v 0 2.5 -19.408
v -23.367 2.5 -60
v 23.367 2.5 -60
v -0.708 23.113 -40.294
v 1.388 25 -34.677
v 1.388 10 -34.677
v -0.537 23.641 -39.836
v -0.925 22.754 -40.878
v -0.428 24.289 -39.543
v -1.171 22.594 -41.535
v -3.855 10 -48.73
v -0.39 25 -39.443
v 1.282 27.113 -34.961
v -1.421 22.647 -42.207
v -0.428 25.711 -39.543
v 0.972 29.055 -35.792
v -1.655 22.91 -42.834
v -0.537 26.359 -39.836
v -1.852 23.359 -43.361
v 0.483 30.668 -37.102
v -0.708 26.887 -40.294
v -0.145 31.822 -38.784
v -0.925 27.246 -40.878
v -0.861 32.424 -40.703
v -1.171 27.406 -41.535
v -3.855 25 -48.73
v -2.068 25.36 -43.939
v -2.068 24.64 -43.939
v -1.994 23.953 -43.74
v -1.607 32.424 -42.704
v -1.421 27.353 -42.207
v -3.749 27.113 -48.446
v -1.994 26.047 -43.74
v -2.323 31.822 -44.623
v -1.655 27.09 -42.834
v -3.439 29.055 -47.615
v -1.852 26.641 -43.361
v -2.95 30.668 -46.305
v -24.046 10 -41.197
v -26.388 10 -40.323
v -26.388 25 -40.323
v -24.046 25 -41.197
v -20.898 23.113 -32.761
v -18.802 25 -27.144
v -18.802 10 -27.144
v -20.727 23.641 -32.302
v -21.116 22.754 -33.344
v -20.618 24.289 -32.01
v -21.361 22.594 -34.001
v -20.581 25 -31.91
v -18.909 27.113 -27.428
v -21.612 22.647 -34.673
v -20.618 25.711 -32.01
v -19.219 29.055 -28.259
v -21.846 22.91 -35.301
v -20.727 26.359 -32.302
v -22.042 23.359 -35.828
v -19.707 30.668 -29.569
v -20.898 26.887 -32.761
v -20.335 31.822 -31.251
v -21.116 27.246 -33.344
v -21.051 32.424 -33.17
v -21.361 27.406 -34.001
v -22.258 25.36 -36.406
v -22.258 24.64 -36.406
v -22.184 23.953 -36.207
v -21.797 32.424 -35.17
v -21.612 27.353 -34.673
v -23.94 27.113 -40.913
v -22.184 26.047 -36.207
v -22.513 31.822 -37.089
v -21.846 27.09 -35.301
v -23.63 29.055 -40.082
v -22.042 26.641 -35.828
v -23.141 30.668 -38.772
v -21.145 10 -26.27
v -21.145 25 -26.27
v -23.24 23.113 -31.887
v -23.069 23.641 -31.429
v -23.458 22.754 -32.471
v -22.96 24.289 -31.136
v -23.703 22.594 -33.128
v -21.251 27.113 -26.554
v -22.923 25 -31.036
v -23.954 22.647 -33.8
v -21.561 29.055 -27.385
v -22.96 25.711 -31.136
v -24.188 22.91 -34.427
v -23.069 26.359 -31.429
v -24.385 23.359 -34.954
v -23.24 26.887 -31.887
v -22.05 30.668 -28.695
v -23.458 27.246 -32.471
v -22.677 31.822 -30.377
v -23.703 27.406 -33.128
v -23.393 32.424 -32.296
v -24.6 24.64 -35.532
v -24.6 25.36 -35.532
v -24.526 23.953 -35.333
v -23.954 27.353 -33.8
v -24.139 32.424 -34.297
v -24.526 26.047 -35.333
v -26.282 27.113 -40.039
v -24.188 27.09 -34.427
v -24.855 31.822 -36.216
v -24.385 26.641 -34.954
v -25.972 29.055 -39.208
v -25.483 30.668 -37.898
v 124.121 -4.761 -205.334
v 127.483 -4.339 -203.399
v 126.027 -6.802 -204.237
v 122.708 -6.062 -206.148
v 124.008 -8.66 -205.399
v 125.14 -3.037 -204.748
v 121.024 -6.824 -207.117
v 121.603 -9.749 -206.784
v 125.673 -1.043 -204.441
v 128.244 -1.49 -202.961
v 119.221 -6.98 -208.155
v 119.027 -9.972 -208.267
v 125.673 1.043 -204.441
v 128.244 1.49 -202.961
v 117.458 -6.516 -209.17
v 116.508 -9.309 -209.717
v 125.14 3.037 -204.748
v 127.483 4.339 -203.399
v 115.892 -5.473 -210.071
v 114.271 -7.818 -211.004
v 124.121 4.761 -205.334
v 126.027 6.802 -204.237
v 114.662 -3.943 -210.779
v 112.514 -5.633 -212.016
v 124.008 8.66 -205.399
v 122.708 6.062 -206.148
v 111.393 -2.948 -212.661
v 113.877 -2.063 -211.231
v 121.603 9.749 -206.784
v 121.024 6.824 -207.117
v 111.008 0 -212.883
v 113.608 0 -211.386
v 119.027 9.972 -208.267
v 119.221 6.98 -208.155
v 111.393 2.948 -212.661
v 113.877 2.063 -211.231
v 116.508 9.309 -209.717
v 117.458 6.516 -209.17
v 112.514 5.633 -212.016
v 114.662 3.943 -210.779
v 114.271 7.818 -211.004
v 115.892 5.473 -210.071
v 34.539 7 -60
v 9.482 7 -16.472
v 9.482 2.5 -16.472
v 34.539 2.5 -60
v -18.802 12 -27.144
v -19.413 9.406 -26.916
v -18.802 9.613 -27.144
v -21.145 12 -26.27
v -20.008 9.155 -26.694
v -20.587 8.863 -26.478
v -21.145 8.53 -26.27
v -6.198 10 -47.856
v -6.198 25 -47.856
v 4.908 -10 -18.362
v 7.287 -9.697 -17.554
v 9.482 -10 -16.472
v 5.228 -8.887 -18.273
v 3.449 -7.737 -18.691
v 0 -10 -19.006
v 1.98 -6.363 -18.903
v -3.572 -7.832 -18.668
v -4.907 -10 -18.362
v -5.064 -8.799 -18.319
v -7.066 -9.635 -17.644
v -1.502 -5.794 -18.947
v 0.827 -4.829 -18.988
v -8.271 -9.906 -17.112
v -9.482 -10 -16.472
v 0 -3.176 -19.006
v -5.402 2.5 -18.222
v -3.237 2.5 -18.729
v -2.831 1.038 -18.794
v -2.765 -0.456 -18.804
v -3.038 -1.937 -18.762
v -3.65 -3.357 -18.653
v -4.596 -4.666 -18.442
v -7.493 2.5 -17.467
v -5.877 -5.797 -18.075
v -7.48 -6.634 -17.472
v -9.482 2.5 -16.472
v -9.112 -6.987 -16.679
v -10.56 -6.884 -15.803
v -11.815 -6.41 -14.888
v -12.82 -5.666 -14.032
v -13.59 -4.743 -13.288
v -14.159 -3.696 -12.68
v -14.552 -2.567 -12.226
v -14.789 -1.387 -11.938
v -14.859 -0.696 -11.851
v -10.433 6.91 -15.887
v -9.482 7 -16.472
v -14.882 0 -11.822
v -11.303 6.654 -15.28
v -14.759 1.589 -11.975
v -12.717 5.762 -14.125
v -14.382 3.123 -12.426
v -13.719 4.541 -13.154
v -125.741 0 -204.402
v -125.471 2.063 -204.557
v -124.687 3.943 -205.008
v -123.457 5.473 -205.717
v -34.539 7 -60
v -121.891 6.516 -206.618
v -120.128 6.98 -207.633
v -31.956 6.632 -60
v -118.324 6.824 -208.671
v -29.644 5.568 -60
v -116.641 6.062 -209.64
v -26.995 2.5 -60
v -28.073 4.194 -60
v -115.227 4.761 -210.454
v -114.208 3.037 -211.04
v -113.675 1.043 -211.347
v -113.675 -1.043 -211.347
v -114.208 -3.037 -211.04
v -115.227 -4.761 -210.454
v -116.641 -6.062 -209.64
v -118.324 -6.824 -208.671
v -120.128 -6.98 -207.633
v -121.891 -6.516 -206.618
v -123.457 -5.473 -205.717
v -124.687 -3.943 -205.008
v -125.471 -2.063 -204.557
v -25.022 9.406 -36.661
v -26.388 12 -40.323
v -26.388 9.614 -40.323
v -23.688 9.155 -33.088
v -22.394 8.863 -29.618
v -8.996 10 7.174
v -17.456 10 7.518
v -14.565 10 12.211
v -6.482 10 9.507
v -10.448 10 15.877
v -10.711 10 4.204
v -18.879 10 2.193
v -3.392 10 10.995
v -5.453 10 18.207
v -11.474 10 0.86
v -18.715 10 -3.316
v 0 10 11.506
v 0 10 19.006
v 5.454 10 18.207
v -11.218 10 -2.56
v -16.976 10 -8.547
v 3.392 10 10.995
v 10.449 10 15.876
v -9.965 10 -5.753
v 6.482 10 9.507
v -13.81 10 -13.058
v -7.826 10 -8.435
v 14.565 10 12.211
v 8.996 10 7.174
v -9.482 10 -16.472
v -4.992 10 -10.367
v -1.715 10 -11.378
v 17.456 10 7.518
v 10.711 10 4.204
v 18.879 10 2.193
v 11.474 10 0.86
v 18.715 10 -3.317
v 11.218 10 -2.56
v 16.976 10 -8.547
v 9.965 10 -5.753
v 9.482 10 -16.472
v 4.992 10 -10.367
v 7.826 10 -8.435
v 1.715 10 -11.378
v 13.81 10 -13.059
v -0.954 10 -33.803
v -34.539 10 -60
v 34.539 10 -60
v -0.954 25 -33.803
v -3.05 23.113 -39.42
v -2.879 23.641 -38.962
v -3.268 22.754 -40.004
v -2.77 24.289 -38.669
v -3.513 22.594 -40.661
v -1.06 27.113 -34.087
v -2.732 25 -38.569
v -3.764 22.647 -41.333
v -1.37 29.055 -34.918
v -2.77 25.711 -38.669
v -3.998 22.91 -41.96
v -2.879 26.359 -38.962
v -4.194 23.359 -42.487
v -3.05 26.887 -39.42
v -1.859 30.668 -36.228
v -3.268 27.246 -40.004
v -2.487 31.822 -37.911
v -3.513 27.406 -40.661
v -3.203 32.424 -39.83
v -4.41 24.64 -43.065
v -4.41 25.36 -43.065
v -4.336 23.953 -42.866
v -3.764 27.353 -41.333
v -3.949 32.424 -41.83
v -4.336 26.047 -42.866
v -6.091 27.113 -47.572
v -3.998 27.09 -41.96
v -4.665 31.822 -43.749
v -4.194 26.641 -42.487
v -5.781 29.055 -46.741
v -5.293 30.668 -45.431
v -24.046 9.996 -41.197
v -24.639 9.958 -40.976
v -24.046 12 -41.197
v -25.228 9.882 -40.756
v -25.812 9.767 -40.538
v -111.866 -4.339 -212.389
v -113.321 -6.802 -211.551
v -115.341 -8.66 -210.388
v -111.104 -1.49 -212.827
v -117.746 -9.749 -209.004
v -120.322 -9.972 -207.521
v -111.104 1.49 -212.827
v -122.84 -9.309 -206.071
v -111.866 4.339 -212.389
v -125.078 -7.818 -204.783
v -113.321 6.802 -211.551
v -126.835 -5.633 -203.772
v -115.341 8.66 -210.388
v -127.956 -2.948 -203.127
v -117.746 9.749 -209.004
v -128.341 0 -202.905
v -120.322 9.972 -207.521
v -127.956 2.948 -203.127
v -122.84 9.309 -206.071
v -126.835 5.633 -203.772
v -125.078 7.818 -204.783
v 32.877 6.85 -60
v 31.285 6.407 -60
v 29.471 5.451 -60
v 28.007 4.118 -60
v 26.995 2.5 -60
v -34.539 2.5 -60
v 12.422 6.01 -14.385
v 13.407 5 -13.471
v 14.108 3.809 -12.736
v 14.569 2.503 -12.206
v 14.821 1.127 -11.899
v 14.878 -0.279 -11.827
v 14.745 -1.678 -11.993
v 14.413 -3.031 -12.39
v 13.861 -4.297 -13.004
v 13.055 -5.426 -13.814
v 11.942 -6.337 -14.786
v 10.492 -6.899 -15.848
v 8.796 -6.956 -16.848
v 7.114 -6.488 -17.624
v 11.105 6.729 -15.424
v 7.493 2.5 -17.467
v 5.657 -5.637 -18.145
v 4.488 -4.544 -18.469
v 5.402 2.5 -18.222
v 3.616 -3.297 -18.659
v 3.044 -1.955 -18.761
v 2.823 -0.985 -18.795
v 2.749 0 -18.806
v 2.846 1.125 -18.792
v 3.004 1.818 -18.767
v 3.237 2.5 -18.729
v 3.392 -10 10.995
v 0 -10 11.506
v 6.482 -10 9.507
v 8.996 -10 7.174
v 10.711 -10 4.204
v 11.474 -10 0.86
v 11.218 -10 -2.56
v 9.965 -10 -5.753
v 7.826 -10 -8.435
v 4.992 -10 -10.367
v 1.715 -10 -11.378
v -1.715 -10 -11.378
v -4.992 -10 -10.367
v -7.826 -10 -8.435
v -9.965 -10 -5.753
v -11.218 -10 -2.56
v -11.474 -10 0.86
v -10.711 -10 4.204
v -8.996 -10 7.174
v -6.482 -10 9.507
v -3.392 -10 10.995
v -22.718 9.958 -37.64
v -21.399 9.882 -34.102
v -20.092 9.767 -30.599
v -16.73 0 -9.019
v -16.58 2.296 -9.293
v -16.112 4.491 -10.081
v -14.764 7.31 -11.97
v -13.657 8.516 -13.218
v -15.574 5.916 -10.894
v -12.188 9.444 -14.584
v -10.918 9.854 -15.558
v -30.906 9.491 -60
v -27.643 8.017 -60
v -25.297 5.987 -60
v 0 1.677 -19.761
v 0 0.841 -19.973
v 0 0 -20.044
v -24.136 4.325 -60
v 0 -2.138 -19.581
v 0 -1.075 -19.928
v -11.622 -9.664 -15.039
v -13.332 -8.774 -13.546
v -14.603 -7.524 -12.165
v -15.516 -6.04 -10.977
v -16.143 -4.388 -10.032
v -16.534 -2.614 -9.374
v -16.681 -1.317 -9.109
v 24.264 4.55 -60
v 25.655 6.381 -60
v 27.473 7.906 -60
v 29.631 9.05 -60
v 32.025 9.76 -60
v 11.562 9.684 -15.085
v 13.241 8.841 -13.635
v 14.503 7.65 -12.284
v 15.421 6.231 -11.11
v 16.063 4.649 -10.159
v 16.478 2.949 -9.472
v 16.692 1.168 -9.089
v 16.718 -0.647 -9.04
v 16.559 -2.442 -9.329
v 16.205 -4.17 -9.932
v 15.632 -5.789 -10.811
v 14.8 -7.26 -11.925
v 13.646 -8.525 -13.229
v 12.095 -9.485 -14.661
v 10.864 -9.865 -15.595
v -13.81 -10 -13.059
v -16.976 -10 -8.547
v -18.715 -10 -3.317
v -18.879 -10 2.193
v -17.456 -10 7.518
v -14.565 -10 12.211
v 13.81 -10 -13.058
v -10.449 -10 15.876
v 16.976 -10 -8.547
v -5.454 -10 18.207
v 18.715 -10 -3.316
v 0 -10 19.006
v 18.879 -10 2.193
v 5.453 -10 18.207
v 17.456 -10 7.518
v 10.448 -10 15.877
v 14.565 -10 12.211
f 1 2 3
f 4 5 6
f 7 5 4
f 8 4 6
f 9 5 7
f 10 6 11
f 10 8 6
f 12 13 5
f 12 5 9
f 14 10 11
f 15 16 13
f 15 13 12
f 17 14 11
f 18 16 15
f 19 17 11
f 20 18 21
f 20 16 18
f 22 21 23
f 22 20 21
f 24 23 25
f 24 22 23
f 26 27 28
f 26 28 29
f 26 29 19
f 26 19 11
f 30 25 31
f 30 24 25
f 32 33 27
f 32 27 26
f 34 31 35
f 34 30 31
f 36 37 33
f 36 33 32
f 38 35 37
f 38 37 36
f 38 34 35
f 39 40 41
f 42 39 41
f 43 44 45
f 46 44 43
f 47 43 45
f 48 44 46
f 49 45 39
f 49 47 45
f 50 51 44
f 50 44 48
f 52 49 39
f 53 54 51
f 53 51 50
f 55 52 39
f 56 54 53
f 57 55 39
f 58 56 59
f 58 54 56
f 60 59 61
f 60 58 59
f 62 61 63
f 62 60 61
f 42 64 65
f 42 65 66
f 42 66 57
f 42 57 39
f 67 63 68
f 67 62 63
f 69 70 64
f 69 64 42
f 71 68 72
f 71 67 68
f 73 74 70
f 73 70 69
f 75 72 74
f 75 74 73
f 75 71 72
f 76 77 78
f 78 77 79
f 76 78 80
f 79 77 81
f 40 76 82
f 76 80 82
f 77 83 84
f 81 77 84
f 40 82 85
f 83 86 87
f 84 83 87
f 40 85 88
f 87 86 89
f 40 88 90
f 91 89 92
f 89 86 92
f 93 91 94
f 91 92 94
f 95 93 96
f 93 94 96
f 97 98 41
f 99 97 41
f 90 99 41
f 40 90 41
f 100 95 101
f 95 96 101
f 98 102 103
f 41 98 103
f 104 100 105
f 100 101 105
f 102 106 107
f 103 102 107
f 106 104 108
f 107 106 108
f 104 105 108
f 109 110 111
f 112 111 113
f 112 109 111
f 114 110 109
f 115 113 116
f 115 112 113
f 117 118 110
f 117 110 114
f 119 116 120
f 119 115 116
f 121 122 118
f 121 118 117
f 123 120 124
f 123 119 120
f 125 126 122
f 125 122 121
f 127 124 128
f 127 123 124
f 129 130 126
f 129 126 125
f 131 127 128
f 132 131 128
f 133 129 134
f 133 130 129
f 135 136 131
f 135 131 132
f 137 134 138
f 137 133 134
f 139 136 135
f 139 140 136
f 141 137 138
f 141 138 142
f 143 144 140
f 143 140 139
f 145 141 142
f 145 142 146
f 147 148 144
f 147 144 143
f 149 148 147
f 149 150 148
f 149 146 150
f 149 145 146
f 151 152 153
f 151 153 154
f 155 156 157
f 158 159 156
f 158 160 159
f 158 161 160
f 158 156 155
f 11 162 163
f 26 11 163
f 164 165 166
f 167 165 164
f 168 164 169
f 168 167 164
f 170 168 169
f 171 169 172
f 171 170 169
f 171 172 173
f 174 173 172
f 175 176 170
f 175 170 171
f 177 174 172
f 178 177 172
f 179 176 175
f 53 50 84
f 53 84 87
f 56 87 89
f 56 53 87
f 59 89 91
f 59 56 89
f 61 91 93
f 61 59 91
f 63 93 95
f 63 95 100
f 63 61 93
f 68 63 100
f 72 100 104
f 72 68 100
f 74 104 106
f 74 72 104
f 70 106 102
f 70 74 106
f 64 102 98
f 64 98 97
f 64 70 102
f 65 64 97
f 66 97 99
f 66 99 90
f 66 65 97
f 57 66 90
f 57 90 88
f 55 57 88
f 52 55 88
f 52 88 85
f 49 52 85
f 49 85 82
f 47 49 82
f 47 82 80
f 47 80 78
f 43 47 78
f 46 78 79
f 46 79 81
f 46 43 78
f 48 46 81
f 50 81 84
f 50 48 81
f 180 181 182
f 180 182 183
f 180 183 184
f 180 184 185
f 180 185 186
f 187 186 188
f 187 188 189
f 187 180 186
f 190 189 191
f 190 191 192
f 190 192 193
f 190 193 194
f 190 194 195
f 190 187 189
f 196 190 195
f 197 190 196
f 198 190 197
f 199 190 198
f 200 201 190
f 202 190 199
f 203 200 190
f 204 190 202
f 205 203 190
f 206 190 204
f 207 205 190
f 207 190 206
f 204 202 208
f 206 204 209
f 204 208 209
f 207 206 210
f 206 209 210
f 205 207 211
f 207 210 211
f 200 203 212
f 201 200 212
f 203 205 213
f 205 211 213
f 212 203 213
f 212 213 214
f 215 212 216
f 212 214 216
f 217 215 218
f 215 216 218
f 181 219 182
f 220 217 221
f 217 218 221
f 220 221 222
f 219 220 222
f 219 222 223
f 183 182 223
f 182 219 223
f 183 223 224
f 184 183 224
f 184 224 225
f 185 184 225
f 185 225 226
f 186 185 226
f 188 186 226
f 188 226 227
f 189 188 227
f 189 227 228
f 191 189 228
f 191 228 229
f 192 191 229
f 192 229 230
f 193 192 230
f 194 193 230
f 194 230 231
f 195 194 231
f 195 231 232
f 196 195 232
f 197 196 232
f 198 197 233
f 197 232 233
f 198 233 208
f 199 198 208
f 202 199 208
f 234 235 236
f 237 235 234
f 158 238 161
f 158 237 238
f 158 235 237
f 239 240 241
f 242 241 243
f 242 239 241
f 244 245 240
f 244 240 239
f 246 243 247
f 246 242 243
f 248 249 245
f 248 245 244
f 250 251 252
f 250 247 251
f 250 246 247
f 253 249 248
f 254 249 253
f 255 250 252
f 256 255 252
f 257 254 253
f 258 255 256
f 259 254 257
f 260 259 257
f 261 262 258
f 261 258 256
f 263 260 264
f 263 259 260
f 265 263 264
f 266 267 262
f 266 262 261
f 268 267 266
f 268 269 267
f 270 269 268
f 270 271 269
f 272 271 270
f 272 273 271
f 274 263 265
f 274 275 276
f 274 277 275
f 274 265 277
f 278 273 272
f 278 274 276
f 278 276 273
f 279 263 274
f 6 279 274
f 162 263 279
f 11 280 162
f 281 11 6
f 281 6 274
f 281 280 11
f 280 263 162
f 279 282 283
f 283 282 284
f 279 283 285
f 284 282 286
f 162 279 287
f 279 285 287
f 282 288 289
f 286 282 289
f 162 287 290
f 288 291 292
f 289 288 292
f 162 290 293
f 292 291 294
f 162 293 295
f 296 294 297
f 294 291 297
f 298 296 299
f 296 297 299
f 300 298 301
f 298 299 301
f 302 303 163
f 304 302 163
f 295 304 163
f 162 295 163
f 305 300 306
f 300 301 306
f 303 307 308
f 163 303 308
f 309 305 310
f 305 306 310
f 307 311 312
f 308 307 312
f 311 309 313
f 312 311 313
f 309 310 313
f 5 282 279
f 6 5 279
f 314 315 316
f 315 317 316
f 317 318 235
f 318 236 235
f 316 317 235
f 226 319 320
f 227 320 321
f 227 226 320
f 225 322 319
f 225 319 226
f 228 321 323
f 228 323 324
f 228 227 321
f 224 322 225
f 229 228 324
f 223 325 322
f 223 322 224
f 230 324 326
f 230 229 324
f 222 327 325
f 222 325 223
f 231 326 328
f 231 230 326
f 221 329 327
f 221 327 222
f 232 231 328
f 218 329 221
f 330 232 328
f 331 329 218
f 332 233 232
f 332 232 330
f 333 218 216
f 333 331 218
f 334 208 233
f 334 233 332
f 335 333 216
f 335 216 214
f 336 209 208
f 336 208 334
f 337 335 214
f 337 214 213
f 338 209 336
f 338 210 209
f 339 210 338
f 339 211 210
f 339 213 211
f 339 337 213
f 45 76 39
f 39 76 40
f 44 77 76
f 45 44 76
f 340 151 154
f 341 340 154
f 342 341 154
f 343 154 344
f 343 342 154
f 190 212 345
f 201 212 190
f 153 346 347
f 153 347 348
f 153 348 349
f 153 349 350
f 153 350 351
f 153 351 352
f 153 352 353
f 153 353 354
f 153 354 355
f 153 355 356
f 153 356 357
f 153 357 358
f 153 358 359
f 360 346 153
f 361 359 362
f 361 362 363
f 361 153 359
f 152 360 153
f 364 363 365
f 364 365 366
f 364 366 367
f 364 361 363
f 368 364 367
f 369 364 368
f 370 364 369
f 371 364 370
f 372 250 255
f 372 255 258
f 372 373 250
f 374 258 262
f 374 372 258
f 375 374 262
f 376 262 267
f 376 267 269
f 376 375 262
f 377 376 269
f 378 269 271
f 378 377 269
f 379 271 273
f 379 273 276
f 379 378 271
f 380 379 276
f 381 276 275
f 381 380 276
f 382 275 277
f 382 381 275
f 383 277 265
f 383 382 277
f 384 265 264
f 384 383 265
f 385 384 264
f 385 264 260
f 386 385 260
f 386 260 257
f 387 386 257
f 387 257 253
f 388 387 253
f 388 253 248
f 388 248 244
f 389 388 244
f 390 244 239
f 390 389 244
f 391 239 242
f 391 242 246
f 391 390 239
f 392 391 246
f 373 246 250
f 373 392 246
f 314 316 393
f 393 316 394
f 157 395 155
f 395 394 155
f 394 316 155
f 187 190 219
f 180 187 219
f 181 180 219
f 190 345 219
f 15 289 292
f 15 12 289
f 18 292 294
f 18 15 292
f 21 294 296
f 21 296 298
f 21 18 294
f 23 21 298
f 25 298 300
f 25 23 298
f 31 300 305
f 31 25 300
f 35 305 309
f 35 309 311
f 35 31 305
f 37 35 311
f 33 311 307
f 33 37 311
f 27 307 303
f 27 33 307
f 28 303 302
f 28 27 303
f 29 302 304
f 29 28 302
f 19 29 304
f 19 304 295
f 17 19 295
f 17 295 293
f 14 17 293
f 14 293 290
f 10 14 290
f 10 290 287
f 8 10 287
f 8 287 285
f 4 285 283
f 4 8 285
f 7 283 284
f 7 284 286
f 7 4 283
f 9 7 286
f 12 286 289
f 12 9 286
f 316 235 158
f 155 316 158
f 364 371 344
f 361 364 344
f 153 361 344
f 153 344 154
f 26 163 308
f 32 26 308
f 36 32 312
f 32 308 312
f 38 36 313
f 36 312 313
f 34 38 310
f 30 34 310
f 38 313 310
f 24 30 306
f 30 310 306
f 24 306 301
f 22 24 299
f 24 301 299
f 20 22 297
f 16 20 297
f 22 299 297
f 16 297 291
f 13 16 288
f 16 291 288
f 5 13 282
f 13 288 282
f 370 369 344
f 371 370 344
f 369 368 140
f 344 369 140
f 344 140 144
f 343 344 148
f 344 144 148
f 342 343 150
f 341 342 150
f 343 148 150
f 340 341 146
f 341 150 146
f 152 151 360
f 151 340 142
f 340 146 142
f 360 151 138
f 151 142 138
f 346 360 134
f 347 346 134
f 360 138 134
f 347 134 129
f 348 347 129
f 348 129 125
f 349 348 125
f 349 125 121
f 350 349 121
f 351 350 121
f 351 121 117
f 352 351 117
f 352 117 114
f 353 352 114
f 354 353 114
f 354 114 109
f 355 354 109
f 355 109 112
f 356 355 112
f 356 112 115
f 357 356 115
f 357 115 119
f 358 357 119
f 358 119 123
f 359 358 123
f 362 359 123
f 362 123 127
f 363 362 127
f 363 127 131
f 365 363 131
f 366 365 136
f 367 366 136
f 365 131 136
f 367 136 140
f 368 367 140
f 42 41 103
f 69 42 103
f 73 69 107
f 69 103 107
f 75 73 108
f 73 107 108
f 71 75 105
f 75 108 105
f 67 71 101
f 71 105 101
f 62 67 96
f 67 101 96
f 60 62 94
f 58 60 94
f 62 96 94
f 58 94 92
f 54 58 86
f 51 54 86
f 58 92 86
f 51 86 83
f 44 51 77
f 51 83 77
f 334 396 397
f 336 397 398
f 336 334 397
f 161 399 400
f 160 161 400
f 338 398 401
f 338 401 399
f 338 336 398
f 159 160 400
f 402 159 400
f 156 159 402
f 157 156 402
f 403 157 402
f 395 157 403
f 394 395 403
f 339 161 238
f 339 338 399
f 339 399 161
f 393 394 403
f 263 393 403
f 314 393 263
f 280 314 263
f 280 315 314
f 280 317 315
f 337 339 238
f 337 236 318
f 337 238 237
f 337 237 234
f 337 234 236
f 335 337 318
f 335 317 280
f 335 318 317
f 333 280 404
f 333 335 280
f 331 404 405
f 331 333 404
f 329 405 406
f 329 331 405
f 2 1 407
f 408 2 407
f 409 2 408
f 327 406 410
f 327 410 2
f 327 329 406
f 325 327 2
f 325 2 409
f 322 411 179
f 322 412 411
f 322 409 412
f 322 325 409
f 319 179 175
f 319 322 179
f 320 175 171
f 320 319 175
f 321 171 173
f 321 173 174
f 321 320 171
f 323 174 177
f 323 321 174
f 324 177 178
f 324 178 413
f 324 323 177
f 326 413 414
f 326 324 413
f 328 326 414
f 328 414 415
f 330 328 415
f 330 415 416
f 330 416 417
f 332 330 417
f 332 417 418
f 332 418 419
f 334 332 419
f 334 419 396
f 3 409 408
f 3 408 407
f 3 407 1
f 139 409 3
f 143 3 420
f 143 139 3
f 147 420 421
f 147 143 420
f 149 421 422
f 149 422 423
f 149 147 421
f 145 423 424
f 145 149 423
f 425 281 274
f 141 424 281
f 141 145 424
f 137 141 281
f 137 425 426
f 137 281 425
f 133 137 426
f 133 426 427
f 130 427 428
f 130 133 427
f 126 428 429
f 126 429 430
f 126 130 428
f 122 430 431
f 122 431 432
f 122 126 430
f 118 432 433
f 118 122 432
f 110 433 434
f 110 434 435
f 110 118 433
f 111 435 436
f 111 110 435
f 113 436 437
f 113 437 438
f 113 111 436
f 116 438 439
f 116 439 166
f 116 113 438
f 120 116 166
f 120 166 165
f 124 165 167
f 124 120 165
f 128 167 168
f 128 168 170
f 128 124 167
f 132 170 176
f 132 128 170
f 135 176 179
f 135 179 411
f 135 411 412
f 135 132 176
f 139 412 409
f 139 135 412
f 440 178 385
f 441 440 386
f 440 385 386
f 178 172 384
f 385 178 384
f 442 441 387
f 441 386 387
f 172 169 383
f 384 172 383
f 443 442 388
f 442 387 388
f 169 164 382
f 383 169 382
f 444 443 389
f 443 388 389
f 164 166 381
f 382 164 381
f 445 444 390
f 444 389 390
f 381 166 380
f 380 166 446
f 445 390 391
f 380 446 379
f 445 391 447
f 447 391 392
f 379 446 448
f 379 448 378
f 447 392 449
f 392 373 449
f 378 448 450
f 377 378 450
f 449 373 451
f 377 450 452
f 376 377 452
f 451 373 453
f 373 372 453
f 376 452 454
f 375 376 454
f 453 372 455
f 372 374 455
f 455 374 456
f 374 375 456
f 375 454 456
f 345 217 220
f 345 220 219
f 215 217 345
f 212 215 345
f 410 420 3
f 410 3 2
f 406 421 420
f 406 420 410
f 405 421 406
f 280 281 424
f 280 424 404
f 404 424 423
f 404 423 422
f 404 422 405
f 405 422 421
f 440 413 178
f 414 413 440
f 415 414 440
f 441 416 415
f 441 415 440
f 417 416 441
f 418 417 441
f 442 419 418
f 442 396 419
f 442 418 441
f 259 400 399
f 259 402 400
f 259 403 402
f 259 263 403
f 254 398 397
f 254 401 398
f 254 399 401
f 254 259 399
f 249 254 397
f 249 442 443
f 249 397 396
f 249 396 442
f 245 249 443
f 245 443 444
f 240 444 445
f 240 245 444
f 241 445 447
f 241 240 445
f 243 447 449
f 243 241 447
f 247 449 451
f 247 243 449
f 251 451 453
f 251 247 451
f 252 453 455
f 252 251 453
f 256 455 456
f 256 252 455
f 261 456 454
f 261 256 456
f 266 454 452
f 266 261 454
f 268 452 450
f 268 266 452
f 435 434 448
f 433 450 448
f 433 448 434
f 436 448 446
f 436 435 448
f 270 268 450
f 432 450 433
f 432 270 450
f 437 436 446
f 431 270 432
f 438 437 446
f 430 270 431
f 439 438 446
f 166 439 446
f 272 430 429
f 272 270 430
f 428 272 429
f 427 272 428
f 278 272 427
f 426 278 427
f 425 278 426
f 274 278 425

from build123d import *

# Parameters (mm, degrees)
SKETCH1_R                = 19.0062
SKETCH1_R_2              = 11.5062
BOSS_EXTRUDE1_DEPTH      = 10
BOSS_EXTRUDE2_REACH      = 268.113
BOSS_EXTRUDE2_END_RADIUS = 19.0062
SKETCH5_R                = 10
SKETCH5_R_2              = 7
BOSS_EXTRUDE3_REACH      = 338.296
BOSS_EXTRUDE3_END_RADIUS = 19.0062
SKETCH6_R                = 10
SKETCH6_R_2              = 7
BOSS_EXTRUDE7_DEPTH      = 7.5
SKETCH14_R               = 2.413
BOSS_EXTRUDE8_DEPTH      = 12.025
SKETCH14_2_R             = 2.413
CUT_EXTRUDE1_DEPTH       = 9.525
SKETCH15_W               = 15
SKETCH15_H               = 4
BOSS_EXTRUDE9_DEPTH      = 2.5


with BuildPart() as part:
    # Sketch1 → Boss-Extrude1 (new, symmetric)
    with BuildSketch(Plane(origin=(0, 0, 0), x_dir=(1, 0, 0), z_dir=(0, 1, 0))):
        with Locations(Location((0, 0, 0), (0, 0, 270))):
            Circle(SKETCH1_R)
        with Locations(Location((0, 0, 0), (0, 0, 270))):
            Circle(SKETCH1_R_2, mode=Mode.SUBTRACT)
    extrude(amount=BOSS_EXTRUDE1_DEPTH, both=True)

    # Boss-Extrude2: up to this cylinder (the profile starts outside it)
    boss_extrude2_end = Plane(origin=(0, 0, 0), z_dir=(0, -1, 0)) * Cylinder(BOSS_EXTRUDE2_END_RADIUS, 575.2384, mode=Mode.PRIVATE)
    # Sketch5 → Boss-Extrude2 (add, up to the surface)
    with BuildSketch(Plane(origin=(119.67422463, 0, -207.893924576), x_dir=(0.8666626120859299, 0, 0.49889469511350093), z_dir=(0.498894695113501, 0, -0.86666261208593)), mode=Mode.PRIVATE) as boss_extrude2_sk1:
        with Locations(Location((0, 0, 0), (0, 0, 180))):
            Circle(SKETCH5_R)
        with Locations(Location((0, 0, 0), (0, 0, 180))):
            Circle(SKETCH5_R_2, mode=Mode.SUBTRACT)
    boss_extrude2_tool1 = extrude(boss_extrude2_sk1.sketch, amount=-BOSS_EXTRUDE2_REACH, mode=Mode.PRIVATE) - boss_extrude2_end
    add(boss_extrude2_tool1.solids().sort_by_distance((128.095722, 0, -203.046086))[0])

    # Boss-Extrude3: up to this cylinder (the profile starts outside it)
    boss_extrude3_end = Plane(origin=(0, 0, 0), z_dir=(0, -1, 0)) * Cylinder(BOSS_EXTRUDE3_END_RADIUS, 715.6044, mode=Mode.PRIVATE)
    # Sketch6 → Boss-Extrude3 (add, up to the surface)
    with BuildSketch(Plane(origin=(-119.67422463, 0, -207.893924576), x_dir=(-0.8666626120859261, 0, 0.4988946951135074), z_dir=(-0.4988946951135074, 0, -0.8666626120859261)), mode=Mode.PRIVATE) as boss_extrude3_sk1:
        Circle(SKETCH6_R)
        Circle(SKETCH6_R_2, mode=Mode.SUBTRACT)
    boss_extrude3_tool1 = extrude(boss_extrude3_sk1.sketch, amount=-BOSS_EXTRUDE3_REACH, mode=Mode.PRIVATE) - boss_extrude3_end
    add(boss_extrude3_tool1.solids().sort_by_distance((-111.252728, 0, -212.741763))[0])

    # Sketch13 → Boss-Extrude7 (add)
    with BuildSketch(Plane(origin=(0, 10, 0), x_dir=(1, 0, 0), z_dir=(0, 1, 0))):
        with BuildLine():
            Line((9.482092354, 16.471962938), (34.539025094, 60))
            Line((34.539025094, 60), (-34.539025094, 60))
            Line((-34.539025094, 60), (-9.482092354, 16.471962938))
            ThreePointArc((-9.482092354, 16.471962938), (0, 19.0062), (9.482092354, 16.471962938))
        make_face()
    extrude(amount=-BOSS_EXTRUDE7_DEPTH)

    # Sketch14 → Boss-Extrude8 (add, symmetric)
    with BuildSketch(Plane(origin=(1.308996148, 0, -0.488385142), x_dir=(0.3495614575204513, 0, 0.936913436458341), z_dir=(-0.9369134364583411, 0, 0.3495614575204513))):
        with BuildLine():
            Line((-47.003772086, 10), (-47.003772086, 25))
            ThreePointArc((-47.003772086, 25), (-39.503772086, 32.5), (-32.003772086, 25))
            Line((-32.003772086, 25), (-32.003772086, 10))
            Line((-32.003772086, 10), (-47.003772086, 10))
        make_face()
        with Locations((-39.503772086, 25)):
            Circle(SKETCH14_R, mode=Mode.SUBTRACT)
    extrude(amount=BOSS_EXTRUDE8_DEPTH, both=True)

    # Sketch14<2> → Cut-Extrude1 (cut, symmetric)
    with BuildSketch(Plane(origin=(1.308996148, 0, -0.488385142), x_dir=(0.3495614575204513, 0, 0.936913436458341), z_dir=(-0.9369134364583411, 0, 0.3495614575204513))):
        with BuildLine():
            Line((-47.003772086, 10), (-47.003772086, 25))
            ThreePointArc((-47.003772086, 25), (-39.503772086, 32.5), (-32.003772086, 25))
            Line((-32.003772086, 25), (-32.003772086, 10))
            Line((-32.003772086, 10), (-47.003772086, 10))
        make_face()
        with Locations((-39.503772086, 25)):
            Circle(SKETCH14_2_R, mode=Mode.SUBTRACT)
    extrude(amount=CUT_EXTRUDE1_DEPTH, both=True, mode=Mode.SUBTRACT)


with BuildPart() as cut_extrude1_piece_1:
    # of the separate pieces the step leaves, piece 1, a body of its own (cut_extrude1_pieces)
    add(part.part.solids().sort_by_distance((111.007598509, 0, -212.882871527))[0])

    # Sketch15 → Boss-Extrude9 (add)
    with BuildSketch(Plane(origin=(-9.957387925, 0, 3.715091385), x_dir=(0.34956145752045137, 0, 0.936913436458341), z_dir=(-0.936913436458341, 0, 0.34956145752045137))):
        with Locations((-39.503772086, 10)):
            Rectangle(SKETCH15_W, SKETCH15_H)
    extrude(amount=-BOSS_EXTRUDE9_DEPTH)


with BuildPart() as cut_extrude1_piece_2:
    # of the separate pieces the step leaves, piece 2, a body of its own (cut_extrude1_pieces)
    add(part.part.solids().sort_by_distance((-18.802389551, 10, -27.143576344))[0])


solid = Compound([cut_extrude1_piece_1.part, cut_extrude1_piece_2.part])
